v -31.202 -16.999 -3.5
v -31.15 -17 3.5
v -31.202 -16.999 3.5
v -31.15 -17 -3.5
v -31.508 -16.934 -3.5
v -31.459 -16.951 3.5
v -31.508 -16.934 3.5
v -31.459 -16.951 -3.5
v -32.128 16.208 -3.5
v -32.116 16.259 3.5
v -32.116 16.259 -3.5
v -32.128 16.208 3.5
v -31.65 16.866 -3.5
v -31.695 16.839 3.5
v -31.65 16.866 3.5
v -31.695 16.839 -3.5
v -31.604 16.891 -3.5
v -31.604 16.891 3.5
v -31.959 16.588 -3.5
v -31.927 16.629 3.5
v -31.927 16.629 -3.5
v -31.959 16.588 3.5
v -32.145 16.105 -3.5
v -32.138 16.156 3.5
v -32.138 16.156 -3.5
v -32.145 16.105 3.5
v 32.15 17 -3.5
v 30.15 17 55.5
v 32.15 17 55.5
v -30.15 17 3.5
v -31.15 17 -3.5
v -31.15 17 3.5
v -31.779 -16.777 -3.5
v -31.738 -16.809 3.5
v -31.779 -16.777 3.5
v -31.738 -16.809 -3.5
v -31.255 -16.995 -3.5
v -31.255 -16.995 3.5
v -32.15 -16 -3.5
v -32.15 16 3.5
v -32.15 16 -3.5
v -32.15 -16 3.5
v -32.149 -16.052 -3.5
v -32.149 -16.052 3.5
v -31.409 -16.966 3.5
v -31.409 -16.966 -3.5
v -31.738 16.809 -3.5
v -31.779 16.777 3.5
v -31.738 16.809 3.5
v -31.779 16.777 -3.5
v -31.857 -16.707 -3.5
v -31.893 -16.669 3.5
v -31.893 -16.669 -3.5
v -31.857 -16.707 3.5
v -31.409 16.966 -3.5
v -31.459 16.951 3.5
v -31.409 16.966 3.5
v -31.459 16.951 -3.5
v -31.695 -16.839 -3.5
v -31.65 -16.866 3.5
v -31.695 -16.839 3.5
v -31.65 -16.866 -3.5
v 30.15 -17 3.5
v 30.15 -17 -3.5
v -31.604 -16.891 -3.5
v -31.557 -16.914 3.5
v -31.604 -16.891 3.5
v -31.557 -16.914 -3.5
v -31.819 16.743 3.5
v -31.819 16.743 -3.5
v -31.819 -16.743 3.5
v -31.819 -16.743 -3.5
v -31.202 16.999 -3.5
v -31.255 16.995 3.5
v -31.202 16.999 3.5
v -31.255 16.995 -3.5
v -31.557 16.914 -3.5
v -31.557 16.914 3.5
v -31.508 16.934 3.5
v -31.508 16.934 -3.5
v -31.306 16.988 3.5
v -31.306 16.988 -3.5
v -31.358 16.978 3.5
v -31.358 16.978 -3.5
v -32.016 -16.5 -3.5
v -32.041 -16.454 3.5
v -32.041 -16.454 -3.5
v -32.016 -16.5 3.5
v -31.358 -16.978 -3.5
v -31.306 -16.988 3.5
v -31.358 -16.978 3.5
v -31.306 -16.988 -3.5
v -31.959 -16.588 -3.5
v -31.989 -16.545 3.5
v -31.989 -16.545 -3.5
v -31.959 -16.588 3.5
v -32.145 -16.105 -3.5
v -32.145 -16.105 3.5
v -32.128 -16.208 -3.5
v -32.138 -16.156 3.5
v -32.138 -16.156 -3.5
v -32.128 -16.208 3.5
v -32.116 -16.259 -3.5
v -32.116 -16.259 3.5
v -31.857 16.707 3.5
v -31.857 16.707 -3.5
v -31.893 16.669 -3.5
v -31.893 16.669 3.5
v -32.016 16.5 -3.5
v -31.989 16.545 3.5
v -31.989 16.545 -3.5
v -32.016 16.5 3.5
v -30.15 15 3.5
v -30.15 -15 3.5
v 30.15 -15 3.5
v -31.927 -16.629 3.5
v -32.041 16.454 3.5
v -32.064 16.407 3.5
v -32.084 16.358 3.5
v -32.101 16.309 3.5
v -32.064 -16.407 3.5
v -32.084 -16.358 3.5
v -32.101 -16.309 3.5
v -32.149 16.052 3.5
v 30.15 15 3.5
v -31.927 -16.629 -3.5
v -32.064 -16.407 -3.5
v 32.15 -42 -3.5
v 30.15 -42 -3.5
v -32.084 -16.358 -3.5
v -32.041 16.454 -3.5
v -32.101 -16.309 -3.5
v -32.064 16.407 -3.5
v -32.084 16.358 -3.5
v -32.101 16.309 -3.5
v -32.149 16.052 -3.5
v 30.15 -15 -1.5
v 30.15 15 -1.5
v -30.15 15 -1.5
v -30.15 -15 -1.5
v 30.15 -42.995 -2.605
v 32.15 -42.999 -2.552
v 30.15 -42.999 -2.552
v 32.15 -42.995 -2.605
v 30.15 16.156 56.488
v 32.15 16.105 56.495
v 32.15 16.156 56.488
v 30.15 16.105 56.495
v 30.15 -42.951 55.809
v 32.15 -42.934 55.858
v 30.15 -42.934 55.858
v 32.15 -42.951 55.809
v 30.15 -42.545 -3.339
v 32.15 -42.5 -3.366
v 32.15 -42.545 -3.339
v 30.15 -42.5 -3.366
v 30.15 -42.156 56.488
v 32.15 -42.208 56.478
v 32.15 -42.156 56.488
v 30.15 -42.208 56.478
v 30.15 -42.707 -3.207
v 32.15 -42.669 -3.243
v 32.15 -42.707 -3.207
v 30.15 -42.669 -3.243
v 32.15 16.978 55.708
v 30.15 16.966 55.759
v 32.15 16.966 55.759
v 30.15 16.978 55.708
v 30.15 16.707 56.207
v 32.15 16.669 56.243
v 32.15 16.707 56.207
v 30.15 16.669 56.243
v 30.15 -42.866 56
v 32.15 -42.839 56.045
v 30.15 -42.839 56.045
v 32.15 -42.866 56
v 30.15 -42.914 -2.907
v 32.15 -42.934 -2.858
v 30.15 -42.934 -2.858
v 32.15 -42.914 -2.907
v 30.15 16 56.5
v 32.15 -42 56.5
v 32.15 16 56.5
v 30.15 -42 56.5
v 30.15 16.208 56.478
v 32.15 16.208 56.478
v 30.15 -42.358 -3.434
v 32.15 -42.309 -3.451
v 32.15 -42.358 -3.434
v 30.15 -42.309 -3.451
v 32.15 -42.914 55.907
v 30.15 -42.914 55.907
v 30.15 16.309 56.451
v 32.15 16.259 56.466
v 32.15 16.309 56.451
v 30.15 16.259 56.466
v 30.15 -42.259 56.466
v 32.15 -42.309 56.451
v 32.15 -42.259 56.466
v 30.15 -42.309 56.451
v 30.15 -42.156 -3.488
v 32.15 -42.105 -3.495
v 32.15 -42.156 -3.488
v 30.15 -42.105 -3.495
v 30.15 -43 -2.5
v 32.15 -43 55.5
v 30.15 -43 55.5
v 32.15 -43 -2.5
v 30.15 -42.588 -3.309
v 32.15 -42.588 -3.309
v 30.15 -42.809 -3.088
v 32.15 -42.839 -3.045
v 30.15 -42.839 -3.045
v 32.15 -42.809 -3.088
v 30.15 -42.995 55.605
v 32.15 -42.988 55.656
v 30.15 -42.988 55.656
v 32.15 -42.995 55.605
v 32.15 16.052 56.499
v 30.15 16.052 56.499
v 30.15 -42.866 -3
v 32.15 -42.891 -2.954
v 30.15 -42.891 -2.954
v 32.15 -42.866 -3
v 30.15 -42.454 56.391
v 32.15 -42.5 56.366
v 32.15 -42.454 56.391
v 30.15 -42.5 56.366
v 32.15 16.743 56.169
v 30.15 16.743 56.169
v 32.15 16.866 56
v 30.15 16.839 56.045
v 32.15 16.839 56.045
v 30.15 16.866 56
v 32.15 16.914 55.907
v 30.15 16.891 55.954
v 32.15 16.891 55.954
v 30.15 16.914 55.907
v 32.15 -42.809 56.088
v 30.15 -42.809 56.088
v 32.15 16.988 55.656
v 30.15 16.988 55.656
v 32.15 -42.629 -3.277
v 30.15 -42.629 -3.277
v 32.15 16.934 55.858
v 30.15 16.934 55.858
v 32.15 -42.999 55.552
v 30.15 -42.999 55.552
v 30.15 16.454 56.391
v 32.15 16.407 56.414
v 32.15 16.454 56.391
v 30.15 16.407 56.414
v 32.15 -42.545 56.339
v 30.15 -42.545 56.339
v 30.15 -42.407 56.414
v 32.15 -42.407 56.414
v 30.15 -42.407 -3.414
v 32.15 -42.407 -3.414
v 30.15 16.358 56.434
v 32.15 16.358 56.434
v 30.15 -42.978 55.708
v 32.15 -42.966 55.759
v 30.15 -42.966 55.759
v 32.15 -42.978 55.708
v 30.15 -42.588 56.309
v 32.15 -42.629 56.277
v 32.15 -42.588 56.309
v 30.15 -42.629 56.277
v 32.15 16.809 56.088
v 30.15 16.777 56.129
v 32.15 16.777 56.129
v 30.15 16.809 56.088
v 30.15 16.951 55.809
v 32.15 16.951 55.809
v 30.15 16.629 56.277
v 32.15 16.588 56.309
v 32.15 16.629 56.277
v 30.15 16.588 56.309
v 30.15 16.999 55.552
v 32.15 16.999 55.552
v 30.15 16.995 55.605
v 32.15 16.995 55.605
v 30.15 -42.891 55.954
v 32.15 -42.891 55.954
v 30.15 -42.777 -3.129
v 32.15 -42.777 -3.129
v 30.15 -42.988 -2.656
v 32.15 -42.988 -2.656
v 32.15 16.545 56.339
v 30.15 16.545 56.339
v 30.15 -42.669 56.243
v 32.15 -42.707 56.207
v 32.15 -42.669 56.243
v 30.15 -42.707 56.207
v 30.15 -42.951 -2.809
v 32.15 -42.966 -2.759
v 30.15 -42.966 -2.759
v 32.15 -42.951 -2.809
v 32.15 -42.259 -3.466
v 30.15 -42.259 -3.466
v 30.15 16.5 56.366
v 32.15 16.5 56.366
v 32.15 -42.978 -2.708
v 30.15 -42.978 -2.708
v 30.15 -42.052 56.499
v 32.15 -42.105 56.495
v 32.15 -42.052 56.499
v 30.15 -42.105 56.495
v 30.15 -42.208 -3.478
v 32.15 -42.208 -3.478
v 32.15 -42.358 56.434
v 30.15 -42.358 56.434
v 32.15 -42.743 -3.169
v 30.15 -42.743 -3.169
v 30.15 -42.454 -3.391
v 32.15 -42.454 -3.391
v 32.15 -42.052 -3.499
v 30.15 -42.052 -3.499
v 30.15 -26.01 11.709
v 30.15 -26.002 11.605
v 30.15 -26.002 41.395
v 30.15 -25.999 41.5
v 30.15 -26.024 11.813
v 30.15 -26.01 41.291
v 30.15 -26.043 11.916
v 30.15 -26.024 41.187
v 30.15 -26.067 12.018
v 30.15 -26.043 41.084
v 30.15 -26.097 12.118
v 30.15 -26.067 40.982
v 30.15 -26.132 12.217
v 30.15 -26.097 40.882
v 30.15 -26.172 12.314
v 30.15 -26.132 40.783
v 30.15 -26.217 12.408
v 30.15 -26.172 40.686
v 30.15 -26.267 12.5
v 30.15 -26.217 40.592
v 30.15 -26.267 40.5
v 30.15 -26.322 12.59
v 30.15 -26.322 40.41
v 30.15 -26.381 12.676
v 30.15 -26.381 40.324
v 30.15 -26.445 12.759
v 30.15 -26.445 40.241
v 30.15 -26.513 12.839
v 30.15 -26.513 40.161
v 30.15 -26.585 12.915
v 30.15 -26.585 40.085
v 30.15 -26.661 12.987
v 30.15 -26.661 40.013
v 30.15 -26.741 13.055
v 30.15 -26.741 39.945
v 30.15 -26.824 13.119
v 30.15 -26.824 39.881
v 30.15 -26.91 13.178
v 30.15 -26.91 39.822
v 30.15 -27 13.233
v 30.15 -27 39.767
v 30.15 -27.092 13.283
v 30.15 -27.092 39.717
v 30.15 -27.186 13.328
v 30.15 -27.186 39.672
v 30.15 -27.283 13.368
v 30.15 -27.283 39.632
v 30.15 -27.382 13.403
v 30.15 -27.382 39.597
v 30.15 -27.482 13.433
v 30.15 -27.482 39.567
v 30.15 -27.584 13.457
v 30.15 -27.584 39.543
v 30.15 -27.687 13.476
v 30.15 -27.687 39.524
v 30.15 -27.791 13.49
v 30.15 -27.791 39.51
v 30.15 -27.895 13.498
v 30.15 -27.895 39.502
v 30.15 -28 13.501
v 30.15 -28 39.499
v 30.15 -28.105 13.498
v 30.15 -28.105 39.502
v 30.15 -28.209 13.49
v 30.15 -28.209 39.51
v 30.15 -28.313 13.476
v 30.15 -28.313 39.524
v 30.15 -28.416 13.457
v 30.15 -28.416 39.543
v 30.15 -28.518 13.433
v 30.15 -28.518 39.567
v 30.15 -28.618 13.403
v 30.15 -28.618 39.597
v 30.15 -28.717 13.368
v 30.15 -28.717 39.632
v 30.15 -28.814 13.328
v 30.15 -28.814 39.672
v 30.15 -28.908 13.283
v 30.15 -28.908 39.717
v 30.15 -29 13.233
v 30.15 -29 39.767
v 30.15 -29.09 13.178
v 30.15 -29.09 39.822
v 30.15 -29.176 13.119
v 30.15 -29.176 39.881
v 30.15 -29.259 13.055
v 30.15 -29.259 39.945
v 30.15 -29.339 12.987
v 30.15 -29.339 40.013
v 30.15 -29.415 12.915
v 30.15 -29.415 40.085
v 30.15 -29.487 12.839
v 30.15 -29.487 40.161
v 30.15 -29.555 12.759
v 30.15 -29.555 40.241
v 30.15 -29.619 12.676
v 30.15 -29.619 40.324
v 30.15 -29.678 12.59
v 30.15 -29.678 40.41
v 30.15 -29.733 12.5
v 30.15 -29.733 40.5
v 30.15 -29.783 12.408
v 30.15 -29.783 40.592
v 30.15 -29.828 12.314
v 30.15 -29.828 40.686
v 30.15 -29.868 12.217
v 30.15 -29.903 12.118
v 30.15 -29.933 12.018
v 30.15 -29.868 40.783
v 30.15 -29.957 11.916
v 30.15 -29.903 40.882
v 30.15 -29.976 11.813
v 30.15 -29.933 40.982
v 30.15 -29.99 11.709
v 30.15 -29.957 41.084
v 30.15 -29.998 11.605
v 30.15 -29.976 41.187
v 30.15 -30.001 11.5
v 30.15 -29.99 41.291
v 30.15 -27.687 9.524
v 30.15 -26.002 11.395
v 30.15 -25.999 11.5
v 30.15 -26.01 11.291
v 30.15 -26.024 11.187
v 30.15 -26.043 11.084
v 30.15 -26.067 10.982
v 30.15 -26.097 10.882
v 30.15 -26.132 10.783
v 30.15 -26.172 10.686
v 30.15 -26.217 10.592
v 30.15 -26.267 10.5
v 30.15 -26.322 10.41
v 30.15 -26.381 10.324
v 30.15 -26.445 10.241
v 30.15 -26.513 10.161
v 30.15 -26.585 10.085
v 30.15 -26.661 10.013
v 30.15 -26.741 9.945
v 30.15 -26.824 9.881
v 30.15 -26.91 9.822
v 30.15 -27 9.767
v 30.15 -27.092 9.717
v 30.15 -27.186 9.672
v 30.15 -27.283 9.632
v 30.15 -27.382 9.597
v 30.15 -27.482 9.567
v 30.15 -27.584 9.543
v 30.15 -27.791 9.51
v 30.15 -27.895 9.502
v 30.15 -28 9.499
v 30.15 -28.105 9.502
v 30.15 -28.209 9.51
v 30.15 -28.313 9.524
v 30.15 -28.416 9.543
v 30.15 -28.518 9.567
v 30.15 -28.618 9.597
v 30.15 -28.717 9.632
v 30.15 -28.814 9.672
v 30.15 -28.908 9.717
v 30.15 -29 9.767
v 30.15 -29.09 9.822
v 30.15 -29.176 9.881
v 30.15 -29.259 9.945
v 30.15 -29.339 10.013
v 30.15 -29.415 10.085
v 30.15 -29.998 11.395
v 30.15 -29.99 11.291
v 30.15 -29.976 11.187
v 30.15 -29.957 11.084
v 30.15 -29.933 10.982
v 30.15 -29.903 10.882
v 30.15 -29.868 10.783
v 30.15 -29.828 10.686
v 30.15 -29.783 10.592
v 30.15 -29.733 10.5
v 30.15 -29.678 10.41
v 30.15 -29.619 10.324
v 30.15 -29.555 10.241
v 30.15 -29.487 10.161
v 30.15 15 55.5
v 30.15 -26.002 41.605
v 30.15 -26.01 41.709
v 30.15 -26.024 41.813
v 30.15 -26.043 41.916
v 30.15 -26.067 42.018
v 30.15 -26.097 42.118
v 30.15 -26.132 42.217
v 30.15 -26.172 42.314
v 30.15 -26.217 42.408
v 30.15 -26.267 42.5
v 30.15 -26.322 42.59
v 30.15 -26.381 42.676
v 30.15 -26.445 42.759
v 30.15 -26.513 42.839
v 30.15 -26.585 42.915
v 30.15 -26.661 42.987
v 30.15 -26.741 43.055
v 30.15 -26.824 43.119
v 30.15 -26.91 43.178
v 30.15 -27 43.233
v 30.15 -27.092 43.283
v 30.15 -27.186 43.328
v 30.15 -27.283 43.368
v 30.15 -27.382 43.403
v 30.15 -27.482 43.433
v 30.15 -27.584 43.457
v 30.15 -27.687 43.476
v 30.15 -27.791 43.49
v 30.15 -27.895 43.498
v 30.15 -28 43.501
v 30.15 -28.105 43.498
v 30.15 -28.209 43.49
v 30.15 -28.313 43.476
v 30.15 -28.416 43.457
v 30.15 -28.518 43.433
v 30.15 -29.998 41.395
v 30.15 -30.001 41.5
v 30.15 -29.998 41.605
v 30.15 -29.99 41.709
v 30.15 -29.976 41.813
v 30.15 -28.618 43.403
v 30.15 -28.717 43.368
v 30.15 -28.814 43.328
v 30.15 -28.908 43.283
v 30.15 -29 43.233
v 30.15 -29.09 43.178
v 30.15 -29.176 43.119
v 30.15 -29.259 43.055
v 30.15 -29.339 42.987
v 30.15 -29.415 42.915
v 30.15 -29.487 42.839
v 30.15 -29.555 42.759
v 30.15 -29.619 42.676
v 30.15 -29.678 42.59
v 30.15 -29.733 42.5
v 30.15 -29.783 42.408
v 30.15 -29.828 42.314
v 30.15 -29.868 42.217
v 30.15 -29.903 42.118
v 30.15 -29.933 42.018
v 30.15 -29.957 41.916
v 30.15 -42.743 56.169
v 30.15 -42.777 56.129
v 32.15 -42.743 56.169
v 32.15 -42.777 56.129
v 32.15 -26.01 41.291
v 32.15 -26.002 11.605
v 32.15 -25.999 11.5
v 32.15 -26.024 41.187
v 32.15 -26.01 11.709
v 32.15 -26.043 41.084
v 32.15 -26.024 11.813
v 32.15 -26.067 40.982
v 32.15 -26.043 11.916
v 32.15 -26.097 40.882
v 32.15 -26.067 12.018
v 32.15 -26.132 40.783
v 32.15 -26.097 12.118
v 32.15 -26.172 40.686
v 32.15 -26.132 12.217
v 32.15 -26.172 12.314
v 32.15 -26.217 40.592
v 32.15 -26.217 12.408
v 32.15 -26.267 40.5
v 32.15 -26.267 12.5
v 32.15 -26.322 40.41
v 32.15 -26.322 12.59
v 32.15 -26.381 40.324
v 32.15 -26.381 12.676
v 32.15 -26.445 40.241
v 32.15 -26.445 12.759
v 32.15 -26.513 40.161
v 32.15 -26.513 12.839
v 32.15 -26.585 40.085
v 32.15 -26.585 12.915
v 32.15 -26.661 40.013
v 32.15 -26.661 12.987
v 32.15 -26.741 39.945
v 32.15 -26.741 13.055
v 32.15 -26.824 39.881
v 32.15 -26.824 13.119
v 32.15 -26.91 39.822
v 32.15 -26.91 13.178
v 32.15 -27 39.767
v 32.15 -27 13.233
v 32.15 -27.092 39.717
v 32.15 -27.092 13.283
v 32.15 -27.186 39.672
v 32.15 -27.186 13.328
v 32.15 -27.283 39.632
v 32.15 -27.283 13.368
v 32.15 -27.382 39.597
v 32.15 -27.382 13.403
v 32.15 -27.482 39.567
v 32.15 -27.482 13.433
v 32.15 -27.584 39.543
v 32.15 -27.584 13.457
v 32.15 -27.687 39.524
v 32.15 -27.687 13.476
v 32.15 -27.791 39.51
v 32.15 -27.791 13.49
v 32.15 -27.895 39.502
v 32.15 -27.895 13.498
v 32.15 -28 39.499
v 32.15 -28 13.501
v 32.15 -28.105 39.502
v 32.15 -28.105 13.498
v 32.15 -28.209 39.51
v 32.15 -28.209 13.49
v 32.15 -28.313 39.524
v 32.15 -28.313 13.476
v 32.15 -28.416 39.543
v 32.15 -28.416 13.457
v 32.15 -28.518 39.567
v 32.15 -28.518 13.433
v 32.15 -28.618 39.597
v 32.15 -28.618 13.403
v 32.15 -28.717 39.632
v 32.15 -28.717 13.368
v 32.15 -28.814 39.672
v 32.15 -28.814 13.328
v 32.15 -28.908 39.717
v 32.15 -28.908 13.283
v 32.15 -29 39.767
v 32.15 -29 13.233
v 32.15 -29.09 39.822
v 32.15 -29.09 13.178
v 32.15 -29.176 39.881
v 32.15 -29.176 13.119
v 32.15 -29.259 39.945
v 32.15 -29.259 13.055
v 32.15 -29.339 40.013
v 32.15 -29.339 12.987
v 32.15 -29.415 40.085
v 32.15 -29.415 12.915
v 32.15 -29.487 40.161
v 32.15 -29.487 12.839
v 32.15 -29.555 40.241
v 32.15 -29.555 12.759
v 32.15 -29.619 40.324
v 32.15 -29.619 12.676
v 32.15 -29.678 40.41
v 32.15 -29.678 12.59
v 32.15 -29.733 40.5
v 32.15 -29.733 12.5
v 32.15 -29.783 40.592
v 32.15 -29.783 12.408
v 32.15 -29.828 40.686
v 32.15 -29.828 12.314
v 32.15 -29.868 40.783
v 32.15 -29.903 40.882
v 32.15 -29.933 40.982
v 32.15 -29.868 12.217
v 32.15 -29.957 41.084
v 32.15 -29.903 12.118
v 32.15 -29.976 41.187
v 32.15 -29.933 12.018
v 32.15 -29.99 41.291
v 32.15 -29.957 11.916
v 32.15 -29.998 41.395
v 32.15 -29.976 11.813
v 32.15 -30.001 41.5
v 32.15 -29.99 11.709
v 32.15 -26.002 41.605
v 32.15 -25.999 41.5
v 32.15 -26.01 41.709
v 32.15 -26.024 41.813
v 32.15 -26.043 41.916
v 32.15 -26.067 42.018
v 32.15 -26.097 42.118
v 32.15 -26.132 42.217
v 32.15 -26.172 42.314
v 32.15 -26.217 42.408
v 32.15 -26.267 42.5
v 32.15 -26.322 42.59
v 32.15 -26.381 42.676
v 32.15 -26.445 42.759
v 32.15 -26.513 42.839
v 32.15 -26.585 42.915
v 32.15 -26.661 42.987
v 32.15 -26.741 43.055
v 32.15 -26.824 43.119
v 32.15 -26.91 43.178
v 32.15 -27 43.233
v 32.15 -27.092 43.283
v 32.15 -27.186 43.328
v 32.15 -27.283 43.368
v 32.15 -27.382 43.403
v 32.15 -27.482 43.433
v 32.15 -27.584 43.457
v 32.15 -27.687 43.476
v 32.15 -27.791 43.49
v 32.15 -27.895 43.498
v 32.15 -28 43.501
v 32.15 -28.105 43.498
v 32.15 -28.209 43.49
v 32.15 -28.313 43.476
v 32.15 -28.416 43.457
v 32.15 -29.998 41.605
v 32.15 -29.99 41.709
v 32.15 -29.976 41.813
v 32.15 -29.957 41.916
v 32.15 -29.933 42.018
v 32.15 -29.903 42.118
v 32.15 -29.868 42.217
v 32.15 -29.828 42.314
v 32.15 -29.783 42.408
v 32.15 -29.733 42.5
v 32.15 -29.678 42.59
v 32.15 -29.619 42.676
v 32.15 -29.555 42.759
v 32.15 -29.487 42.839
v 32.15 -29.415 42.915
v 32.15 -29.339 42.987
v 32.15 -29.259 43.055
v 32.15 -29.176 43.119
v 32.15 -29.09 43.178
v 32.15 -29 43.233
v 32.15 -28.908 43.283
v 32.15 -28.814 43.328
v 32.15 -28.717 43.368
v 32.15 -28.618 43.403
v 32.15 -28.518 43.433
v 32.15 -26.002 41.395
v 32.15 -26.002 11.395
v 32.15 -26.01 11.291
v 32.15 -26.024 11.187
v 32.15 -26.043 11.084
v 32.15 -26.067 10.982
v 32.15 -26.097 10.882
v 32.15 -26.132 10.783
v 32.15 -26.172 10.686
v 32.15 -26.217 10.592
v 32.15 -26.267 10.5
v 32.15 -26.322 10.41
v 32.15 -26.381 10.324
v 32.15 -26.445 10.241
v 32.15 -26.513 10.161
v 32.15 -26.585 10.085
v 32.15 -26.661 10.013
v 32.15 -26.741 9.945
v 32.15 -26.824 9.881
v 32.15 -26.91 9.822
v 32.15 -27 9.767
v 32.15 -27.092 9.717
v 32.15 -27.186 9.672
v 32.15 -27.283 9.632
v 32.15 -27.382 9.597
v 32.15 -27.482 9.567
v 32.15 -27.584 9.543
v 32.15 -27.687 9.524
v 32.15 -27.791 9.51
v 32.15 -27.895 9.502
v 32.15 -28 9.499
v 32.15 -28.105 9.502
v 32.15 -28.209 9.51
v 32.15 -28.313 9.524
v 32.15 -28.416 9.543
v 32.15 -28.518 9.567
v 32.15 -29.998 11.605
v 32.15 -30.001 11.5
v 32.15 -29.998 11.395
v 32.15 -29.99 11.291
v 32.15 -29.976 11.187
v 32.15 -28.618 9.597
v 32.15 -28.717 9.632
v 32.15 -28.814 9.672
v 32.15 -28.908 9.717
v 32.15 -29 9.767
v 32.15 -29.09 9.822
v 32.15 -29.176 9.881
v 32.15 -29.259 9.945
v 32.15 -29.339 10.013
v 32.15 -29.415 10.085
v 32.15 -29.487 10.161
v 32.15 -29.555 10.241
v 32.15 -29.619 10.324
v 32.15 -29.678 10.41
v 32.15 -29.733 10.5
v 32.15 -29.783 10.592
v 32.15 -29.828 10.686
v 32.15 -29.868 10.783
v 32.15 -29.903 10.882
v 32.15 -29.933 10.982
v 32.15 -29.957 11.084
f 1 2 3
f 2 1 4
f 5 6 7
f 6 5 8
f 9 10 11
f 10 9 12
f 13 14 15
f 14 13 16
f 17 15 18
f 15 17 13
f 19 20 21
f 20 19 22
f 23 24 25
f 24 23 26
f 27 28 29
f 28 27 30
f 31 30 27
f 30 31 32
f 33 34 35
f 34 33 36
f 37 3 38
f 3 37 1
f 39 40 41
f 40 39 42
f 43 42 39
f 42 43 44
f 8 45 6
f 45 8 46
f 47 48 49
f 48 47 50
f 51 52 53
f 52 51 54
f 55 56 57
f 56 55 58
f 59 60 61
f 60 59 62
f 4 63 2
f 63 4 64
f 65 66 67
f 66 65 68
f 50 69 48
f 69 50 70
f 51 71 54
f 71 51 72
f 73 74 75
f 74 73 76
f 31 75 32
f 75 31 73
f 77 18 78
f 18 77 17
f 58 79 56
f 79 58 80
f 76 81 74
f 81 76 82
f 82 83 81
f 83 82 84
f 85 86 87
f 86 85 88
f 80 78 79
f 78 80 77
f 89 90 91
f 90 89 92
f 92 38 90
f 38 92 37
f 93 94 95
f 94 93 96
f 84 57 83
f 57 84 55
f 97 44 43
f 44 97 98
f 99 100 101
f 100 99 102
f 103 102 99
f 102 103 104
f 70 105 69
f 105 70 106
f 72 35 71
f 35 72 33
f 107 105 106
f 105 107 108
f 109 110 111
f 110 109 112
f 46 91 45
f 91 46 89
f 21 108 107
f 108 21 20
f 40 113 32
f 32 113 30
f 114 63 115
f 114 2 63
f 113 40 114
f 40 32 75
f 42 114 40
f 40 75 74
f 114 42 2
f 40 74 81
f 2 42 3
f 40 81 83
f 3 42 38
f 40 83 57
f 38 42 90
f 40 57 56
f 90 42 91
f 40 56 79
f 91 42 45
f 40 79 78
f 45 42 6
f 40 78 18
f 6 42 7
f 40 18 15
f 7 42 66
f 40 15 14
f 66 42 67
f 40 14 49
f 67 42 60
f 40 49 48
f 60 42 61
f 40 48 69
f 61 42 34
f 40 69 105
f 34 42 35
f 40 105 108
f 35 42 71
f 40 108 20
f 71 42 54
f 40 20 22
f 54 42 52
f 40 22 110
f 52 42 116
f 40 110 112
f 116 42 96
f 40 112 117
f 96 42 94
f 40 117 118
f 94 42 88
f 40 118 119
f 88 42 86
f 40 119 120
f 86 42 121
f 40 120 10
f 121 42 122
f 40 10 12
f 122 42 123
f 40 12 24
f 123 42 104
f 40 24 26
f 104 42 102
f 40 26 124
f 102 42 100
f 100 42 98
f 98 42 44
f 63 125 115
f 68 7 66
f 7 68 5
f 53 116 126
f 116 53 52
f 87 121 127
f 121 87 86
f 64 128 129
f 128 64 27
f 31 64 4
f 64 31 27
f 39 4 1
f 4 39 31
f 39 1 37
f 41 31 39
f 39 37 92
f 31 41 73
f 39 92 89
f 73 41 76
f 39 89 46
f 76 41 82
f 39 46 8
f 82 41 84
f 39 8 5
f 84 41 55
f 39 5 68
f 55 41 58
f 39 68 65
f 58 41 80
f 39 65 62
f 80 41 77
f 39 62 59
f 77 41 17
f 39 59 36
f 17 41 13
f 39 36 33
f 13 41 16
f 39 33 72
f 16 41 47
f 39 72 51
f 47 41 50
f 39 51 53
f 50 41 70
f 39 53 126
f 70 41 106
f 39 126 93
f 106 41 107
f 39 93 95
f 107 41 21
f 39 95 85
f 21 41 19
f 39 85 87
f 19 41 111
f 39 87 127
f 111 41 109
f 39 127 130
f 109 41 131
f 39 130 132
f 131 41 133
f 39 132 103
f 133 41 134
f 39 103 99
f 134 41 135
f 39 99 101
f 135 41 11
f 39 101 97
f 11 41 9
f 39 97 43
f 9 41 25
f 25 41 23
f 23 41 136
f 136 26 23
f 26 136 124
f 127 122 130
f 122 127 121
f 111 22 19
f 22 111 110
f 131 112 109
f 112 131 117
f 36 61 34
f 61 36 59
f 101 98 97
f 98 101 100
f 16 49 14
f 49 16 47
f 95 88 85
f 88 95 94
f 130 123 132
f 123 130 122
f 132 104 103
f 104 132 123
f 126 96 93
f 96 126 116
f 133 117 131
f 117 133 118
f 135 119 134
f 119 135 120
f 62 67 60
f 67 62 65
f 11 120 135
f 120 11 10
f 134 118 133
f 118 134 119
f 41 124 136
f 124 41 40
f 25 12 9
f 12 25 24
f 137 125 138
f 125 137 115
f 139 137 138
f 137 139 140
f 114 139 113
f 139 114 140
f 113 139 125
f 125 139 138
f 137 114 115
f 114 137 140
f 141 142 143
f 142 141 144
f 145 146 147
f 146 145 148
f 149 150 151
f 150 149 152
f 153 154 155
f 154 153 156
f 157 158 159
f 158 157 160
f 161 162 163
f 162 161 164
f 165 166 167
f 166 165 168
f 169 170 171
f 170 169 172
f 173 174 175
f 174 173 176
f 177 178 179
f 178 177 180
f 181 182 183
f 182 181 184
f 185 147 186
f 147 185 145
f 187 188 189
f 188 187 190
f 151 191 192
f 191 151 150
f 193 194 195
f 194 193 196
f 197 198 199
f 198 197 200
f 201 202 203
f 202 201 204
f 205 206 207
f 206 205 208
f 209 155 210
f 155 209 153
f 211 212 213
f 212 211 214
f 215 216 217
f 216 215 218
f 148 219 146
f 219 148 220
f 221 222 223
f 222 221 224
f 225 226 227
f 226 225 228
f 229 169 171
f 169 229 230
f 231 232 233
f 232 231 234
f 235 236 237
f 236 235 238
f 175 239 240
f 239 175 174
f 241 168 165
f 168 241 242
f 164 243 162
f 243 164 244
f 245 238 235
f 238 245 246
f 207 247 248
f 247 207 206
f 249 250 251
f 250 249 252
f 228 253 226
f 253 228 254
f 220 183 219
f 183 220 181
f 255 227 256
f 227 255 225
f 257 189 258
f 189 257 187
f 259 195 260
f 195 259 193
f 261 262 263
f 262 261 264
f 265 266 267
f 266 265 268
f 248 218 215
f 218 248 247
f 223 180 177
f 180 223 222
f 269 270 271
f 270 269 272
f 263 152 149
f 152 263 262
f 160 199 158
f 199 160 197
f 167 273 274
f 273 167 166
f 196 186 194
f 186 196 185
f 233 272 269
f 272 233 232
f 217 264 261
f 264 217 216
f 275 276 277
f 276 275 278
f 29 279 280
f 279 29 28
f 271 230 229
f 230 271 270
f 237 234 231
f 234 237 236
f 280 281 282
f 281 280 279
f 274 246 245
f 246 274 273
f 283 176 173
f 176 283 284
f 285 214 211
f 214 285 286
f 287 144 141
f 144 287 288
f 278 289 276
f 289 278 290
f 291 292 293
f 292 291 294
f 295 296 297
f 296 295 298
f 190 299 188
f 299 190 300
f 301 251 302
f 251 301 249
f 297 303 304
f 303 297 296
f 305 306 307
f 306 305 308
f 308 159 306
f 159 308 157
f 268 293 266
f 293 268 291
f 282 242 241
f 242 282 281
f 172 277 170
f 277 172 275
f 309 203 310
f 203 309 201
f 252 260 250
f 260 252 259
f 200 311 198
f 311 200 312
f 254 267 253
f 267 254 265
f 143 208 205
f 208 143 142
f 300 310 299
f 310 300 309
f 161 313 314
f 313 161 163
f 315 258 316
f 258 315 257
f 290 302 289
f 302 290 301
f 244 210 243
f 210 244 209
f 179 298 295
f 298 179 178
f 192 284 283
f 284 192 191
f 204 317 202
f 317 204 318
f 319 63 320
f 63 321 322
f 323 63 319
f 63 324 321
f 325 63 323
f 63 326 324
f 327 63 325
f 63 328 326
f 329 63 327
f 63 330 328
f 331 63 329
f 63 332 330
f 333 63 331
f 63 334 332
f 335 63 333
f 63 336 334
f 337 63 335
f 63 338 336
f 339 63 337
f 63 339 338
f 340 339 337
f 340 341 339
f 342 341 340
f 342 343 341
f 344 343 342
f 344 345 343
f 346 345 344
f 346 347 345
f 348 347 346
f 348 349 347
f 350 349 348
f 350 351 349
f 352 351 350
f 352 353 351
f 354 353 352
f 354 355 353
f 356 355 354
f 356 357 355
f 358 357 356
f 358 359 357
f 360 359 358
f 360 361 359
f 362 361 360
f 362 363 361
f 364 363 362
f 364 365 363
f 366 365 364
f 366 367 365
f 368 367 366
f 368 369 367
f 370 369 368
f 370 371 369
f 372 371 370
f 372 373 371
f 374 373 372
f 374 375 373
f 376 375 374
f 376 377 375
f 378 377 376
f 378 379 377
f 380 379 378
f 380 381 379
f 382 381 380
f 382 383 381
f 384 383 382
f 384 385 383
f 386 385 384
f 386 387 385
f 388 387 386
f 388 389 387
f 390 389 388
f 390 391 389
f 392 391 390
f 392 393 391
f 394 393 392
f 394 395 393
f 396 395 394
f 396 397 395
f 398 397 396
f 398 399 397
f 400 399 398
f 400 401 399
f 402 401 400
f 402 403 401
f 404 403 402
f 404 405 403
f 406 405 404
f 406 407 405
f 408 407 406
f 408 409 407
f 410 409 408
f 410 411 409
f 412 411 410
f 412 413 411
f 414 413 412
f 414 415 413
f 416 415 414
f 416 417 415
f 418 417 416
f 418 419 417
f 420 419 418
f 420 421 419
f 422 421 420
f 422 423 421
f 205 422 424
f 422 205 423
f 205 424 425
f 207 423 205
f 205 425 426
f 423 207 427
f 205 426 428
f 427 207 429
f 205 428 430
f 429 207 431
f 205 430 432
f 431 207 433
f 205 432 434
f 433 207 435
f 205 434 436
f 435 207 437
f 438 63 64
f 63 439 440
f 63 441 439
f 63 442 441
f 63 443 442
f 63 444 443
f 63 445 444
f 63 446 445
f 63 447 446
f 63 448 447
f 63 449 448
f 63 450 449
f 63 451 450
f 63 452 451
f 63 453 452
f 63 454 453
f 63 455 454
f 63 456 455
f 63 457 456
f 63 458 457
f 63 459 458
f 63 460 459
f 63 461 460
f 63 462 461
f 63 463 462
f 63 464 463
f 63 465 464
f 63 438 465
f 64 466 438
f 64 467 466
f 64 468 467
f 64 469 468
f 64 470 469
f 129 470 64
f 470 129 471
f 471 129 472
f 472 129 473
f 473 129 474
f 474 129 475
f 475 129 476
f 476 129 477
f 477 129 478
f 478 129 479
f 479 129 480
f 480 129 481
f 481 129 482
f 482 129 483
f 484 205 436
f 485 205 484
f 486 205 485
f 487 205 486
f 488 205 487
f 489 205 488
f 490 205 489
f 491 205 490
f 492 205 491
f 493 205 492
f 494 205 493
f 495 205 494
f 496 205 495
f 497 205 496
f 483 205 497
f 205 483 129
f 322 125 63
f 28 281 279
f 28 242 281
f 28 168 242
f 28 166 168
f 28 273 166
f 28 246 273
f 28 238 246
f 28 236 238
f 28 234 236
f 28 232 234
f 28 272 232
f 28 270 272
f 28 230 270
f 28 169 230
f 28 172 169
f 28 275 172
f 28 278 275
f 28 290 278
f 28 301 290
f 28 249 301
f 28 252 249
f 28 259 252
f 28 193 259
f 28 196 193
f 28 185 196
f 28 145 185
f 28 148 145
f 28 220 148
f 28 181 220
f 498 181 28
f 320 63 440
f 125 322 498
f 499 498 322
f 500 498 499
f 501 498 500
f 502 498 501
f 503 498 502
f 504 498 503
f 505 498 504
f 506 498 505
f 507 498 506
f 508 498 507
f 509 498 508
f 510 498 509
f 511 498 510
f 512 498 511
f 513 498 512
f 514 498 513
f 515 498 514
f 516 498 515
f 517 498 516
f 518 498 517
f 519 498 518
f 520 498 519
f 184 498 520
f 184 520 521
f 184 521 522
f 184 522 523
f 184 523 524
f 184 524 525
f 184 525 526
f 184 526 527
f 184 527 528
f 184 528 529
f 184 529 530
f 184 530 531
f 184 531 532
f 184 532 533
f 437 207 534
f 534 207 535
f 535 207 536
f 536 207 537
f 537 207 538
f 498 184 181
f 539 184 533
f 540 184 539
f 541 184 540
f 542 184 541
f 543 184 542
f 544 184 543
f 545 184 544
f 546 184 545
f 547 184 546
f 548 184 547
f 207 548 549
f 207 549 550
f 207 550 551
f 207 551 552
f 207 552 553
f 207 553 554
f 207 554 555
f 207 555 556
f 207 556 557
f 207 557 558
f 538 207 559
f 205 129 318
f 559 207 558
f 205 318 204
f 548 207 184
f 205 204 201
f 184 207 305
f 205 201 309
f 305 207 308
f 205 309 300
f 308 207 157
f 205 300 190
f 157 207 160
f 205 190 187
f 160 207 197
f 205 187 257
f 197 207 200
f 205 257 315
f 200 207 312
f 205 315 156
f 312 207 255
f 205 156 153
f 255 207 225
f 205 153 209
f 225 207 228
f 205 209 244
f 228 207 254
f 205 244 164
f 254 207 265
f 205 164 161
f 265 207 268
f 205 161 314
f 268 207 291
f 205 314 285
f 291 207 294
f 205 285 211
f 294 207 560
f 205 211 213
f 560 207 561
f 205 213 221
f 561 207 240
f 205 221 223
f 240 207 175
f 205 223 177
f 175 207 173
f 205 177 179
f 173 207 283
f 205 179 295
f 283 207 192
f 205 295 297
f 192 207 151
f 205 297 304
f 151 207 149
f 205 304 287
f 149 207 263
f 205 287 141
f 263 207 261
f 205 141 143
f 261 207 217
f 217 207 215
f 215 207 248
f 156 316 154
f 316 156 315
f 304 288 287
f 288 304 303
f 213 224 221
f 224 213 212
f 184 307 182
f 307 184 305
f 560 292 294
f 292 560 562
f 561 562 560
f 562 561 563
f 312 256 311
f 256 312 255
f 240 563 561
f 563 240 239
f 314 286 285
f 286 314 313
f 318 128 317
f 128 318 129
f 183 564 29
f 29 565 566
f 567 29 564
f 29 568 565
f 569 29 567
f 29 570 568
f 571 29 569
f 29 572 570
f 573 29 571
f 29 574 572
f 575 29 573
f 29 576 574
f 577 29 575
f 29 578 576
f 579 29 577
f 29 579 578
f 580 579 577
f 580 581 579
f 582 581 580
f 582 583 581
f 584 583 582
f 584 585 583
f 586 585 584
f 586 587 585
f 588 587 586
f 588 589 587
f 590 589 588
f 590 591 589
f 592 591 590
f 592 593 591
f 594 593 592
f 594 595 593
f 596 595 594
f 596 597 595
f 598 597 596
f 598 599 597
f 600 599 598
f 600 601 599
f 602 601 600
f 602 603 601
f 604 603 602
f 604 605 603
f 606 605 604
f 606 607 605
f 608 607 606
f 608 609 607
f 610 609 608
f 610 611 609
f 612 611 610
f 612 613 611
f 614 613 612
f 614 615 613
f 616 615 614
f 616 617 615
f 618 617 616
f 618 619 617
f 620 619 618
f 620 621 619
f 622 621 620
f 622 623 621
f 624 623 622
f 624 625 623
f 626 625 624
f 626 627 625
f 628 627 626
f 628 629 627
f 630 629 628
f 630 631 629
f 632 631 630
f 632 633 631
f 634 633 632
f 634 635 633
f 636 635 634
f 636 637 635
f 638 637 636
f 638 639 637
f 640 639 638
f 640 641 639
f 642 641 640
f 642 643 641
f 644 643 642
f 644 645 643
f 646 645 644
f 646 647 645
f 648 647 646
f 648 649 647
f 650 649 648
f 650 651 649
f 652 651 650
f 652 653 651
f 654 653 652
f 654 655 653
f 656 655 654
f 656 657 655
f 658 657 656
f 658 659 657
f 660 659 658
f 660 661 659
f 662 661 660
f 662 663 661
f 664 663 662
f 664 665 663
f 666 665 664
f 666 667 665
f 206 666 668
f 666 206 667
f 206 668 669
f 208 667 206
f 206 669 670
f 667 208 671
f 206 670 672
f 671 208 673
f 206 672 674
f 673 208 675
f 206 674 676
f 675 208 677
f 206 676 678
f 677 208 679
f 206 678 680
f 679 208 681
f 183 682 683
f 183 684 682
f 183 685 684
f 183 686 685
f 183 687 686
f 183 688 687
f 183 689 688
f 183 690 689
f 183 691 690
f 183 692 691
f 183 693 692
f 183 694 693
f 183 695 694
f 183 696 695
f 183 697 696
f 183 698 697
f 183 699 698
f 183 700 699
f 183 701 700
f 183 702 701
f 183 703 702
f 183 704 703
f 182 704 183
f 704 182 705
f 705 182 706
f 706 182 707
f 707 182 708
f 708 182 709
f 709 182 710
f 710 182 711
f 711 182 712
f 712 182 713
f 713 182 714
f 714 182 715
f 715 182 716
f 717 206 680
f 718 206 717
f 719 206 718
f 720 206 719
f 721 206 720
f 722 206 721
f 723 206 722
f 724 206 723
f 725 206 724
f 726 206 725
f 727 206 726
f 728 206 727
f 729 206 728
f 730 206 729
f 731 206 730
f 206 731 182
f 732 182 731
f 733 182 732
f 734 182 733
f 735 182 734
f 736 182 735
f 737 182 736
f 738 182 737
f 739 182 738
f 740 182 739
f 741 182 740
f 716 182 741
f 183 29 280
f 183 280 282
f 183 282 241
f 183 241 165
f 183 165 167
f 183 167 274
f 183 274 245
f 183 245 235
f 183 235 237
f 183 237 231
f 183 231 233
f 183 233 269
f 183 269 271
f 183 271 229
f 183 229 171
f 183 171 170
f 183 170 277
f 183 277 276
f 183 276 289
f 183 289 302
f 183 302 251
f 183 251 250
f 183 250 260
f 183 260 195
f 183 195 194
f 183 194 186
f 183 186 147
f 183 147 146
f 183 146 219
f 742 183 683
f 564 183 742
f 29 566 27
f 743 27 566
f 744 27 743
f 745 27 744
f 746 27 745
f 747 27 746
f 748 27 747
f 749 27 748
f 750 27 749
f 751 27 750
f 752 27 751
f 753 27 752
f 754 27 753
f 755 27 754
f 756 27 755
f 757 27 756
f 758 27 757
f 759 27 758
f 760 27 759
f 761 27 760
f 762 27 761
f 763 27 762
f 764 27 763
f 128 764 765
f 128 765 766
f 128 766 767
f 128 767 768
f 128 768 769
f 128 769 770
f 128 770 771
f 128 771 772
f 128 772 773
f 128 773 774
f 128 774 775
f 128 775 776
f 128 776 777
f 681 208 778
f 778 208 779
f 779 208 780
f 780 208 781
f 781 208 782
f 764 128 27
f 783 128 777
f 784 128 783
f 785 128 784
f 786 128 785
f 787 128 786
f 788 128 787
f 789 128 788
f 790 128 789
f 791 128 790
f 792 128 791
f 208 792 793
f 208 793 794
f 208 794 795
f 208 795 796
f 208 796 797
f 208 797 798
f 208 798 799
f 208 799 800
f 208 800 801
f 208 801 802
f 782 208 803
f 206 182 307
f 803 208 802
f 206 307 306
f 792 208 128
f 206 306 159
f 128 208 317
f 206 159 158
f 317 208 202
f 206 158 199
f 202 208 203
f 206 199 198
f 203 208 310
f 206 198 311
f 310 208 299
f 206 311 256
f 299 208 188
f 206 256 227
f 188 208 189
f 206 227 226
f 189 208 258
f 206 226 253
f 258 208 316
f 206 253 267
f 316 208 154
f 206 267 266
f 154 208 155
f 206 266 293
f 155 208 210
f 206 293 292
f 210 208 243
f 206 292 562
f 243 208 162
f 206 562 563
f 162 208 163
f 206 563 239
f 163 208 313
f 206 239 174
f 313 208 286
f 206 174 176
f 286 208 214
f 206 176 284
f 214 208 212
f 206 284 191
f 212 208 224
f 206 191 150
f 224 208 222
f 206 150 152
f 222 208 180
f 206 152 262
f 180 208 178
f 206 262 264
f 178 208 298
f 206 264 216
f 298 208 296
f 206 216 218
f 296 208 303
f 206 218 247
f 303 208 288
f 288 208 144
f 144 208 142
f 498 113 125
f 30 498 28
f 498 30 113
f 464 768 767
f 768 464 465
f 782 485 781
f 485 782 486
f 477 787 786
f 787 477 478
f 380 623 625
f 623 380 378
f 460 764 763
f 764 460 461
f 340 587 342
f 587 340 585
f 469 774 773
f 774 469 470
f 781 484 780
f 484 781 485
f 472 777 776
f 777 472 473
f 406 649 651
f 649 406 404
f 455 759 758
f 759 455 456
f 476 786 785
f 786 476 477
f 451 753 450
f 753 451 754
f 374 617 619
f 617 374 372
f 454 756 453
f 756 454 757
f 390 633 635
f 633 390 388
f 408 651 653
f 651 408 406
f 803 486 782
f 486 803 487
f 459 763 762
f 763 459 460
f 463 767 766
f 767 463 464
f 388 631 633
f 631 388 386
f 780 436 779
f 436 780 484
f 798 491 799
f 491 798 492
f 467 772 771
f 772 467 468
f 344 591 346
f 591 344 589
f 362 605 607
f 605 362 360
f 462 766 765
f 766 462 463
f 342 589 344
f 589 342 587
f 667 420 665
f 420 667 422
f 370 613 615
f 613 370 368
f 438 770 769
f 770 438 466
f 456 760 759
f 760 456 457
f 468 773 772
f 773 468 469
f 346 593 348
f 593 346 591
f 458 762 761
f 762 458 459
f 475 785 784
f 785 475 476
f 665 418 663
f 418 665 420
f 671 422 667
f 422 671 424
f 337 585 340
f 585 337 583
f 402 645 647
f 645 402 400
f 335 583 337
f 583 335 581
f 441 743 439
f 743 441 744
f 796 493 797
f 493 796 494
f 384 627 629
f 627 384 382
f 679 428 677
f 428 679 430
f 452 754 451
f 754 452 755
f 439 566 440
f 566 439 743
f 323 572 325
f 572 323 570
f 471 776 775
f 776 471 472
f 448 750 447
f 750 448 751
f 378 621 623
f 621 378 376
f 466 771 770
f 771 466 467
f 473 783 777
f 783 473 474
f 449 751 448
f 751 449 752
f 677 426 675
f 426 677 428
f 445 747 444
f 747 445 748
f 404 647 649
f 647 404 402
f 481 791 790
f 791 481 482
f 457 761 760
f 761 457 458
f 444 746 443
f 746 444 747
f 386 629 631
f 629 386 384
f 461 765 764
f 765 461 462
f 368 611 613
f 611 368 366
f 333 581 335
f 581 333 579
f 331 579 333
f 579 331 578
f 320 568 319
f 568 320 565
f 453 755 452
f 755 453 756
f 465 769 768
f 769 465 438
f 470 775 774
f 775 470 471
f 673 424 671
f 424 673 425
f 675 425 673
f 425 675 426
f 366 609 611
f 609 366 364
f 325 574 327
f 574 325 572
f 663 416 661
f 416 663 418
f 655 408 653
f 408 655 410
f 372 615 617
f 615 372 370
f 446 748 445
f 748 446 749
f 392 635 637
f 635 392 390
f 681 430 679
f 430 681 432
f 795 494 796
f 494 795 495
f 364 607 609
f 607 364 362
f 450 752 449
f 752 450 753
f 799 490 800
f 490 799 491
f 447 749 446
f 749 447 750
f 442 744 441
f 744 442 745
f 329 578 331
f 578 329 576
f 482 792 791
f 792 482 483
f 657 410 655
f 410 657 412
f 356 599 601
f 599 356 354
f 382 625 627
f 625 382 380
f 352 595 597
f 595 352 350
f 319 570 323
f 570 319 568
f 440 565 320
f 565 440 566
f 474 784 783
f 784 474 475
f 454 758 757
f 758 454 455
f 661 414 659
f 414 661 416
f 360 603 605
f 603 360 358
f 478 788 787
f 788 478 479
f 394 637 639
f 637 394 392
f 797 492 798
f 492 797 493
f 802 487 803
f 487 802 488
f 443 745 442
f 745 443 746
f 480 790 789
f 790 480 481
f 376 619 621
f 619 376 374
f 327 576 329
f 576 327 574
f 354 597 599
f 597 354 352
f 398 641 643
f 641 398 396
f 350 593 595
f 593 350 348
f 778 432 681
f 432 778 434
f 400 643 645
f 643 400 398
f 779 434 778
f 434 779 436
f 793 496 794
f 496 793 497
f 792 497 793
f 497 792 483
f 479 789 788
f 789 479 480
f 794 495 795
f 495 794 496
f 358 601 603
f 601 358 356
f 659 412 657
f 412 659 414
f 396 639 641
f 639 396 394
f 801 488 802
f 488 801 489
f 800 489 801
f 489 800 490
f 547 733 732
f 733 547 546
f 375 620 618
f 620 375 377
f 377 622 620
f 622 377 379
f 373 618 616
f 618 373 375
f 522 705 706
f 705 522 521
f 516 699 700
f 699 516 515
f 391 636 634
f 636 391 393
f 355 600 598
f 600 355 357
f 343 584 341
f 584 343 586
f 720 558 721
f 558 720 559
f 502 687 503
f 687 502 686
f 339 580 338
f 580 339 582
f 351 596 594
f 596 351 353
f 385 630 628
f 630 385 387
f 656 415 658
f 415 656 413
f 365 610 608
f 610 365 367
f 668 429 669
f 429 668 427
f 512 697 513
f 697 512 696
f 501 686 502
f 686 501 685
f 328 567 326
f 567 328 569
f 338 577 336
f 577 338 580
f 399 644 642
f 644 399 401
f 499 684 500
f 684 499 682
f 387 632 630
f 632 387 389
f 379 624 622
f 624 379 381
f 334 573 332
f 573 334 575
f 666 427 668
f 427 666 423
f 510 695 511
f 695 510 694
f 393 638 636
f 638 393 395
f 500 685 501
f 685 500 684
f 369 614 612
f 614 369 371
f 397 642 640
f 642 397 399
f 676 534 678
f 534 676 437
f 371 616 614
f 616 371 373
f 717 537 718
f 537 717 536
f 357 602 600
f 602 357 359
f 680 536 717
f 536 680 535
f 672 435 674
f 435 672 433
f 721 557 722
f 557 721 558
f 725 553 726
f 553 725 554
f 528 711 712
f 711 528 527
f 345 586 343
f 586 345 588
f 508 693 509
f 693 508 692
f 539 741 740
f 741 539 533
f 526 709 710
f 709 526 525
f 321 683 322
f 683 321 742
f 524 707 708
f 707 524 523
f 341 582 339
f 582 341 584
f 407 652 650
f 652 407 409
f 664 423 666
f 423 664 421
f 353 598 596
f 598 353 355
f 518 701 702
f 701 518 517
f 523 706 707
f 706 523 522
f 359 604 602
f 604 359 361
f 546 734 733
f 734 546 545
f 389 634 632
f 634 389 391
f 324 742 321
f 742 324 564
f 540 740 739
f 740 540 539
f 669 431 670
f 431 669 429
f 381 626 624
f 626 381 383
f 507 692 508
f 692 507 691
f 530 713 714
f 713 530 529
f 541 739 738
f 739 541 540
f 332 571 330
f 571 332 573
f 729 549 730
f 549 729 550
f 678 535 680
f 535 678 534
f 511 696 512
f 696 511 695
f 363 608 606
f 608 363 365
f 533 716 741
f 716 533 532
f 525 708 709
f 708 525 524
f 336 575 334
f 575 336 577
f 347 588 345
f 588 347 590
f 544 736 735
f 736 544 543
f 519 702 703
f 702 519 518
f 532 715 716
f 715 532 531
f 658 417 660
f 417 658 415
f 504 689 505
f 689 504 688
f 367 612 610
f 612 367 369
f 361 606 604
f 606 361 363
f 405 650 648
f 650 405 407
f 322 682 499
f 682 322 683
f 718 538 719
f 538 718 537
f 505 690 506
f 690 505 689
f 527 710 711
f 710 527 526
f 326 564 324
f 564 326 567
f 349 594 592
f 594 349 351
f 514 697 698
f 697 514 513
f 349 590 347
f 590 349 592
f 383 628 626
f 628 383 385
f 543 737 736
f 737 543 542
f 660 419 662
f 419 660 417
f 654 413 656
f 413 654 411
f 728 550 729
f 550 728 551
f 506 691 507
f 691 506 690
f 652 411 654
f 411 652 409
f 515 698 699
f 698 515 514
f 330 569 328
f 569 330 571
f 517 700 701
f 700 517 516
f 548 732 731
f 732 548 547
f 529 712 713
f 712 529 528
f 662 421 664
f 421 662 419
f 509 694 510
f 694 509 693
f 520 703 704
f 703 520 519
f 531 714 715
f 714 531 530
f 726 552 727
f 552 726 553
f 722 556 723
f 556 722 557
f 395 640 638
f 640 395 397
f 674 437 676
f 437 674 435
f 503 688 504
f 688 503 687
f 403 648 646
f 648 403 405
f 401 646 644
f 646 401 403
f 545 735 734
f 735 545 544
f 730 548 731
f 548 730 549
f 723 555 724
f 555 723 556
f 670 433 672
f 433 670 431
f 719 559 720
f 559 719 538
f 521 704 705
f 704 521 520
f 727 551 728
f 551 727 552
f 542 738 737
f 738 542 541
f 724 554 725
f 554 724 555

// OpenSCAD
// Customizable Raspberry Pi Case Extrusion Bracket
// Copyright: Olle Wreede 2020
// License: CC BY-SA

//CUSTOMIZER VARIABLES

// Thickness in mm of bracket
bracket_thickness = 2; // [2:1:6]

// Radius of corners of bracket
bracket_corner_radius = 1; // [0:0.5:2.5]

// Diameter in mm of mount screw holes
mount_hole_diameter = 4; // [0:None, 3:M3, 4:M4, 5:M5, 6:M6]

pi_width = 60.3;

pi_height = 30;

plate_height = 60;

case_depth = 5;


//CUSTOMIZER VARIABLES END

/* [Hidden] */

// 30mm
// 90mm
// 60.3mm
// 5mm

$fn=120;


module cylinder_outer(diameter, height, fn) {
   fudge = 1 / cos(180 / fn);
   cylinder(h=height, r=diameter / 2 * fudge, $fn=fn, center=true);
}

module cube_rounded(width, height, thickness, radius=1) {
	minkowski() {
		cube([width - 2 * radius, height - 2 * radius, thickness/2], center = true);
		cylinder(r = radius, h = thickness/2, center = true);
	}
}

module mount_holes(hole_diameter, hole_distance, hole_depth) {
    translate([hole_distance, -hole_distance, 0])
    #cylinder_outer(hole_diameter, hole_depth, $fn);
    
    translate([-hole_distance, -hole_distance, 0])
    #cylinder_outer(hole_diameter, hole_depth, $fn);
}

module mount_plate(pi_width, pi_height, thickness, height, case_depth, radius) {
    translate([pi_width / 2 + thickness / 2, -pi_height / 2 + thickness, height / 2 - (5 + thickness) / 2])
    difference() {
        union() {
            rotate([0, 90, 0]) {
                cube_rounded(60, height, thickness);
                
                translate([0, 60/2 - thickness, thickness/2])
                rotate([0, 90, 90])
                linear_extrude(height=thickness)
                polygon(points=[
                    [thickness, -30 + case_depth + thickness],
                    [pi_width + thickness, -30 + case_depth + thickness],
                    [thickness, 30 - radius]
                ]);
                
                // Hide rounded corner
                translate([60 / 2 - thickness / 2, height / 2- thickness / 2, 0])
                cube([thickness, thickness, thickness], center=true);
            }
        }
        
        rotate([0, 90, 0])
        mount_holes(mount_hole_diameter, 15, thickness);
    }
}

module case_holder(pi_width, pi_height, thickness, radius, plate_height, case_depth) {
    difference() {
        cube_rounded(pi_width + thickness * 2, pi_height + thickness * 2, 5 + bracket_thickness, radius);
        
        translate([0, 0, thickness / 2])
        cube([pi_width, pi_height, case_depth], center=true);
    }
    
    mount_plate(pi_width, pi_height, thickness, plate_height, case_depth, radius);
}

case_holder(pi_width, pi_height, bracket_thickness, bracket_corner_radius, plate_height, case_depth);
